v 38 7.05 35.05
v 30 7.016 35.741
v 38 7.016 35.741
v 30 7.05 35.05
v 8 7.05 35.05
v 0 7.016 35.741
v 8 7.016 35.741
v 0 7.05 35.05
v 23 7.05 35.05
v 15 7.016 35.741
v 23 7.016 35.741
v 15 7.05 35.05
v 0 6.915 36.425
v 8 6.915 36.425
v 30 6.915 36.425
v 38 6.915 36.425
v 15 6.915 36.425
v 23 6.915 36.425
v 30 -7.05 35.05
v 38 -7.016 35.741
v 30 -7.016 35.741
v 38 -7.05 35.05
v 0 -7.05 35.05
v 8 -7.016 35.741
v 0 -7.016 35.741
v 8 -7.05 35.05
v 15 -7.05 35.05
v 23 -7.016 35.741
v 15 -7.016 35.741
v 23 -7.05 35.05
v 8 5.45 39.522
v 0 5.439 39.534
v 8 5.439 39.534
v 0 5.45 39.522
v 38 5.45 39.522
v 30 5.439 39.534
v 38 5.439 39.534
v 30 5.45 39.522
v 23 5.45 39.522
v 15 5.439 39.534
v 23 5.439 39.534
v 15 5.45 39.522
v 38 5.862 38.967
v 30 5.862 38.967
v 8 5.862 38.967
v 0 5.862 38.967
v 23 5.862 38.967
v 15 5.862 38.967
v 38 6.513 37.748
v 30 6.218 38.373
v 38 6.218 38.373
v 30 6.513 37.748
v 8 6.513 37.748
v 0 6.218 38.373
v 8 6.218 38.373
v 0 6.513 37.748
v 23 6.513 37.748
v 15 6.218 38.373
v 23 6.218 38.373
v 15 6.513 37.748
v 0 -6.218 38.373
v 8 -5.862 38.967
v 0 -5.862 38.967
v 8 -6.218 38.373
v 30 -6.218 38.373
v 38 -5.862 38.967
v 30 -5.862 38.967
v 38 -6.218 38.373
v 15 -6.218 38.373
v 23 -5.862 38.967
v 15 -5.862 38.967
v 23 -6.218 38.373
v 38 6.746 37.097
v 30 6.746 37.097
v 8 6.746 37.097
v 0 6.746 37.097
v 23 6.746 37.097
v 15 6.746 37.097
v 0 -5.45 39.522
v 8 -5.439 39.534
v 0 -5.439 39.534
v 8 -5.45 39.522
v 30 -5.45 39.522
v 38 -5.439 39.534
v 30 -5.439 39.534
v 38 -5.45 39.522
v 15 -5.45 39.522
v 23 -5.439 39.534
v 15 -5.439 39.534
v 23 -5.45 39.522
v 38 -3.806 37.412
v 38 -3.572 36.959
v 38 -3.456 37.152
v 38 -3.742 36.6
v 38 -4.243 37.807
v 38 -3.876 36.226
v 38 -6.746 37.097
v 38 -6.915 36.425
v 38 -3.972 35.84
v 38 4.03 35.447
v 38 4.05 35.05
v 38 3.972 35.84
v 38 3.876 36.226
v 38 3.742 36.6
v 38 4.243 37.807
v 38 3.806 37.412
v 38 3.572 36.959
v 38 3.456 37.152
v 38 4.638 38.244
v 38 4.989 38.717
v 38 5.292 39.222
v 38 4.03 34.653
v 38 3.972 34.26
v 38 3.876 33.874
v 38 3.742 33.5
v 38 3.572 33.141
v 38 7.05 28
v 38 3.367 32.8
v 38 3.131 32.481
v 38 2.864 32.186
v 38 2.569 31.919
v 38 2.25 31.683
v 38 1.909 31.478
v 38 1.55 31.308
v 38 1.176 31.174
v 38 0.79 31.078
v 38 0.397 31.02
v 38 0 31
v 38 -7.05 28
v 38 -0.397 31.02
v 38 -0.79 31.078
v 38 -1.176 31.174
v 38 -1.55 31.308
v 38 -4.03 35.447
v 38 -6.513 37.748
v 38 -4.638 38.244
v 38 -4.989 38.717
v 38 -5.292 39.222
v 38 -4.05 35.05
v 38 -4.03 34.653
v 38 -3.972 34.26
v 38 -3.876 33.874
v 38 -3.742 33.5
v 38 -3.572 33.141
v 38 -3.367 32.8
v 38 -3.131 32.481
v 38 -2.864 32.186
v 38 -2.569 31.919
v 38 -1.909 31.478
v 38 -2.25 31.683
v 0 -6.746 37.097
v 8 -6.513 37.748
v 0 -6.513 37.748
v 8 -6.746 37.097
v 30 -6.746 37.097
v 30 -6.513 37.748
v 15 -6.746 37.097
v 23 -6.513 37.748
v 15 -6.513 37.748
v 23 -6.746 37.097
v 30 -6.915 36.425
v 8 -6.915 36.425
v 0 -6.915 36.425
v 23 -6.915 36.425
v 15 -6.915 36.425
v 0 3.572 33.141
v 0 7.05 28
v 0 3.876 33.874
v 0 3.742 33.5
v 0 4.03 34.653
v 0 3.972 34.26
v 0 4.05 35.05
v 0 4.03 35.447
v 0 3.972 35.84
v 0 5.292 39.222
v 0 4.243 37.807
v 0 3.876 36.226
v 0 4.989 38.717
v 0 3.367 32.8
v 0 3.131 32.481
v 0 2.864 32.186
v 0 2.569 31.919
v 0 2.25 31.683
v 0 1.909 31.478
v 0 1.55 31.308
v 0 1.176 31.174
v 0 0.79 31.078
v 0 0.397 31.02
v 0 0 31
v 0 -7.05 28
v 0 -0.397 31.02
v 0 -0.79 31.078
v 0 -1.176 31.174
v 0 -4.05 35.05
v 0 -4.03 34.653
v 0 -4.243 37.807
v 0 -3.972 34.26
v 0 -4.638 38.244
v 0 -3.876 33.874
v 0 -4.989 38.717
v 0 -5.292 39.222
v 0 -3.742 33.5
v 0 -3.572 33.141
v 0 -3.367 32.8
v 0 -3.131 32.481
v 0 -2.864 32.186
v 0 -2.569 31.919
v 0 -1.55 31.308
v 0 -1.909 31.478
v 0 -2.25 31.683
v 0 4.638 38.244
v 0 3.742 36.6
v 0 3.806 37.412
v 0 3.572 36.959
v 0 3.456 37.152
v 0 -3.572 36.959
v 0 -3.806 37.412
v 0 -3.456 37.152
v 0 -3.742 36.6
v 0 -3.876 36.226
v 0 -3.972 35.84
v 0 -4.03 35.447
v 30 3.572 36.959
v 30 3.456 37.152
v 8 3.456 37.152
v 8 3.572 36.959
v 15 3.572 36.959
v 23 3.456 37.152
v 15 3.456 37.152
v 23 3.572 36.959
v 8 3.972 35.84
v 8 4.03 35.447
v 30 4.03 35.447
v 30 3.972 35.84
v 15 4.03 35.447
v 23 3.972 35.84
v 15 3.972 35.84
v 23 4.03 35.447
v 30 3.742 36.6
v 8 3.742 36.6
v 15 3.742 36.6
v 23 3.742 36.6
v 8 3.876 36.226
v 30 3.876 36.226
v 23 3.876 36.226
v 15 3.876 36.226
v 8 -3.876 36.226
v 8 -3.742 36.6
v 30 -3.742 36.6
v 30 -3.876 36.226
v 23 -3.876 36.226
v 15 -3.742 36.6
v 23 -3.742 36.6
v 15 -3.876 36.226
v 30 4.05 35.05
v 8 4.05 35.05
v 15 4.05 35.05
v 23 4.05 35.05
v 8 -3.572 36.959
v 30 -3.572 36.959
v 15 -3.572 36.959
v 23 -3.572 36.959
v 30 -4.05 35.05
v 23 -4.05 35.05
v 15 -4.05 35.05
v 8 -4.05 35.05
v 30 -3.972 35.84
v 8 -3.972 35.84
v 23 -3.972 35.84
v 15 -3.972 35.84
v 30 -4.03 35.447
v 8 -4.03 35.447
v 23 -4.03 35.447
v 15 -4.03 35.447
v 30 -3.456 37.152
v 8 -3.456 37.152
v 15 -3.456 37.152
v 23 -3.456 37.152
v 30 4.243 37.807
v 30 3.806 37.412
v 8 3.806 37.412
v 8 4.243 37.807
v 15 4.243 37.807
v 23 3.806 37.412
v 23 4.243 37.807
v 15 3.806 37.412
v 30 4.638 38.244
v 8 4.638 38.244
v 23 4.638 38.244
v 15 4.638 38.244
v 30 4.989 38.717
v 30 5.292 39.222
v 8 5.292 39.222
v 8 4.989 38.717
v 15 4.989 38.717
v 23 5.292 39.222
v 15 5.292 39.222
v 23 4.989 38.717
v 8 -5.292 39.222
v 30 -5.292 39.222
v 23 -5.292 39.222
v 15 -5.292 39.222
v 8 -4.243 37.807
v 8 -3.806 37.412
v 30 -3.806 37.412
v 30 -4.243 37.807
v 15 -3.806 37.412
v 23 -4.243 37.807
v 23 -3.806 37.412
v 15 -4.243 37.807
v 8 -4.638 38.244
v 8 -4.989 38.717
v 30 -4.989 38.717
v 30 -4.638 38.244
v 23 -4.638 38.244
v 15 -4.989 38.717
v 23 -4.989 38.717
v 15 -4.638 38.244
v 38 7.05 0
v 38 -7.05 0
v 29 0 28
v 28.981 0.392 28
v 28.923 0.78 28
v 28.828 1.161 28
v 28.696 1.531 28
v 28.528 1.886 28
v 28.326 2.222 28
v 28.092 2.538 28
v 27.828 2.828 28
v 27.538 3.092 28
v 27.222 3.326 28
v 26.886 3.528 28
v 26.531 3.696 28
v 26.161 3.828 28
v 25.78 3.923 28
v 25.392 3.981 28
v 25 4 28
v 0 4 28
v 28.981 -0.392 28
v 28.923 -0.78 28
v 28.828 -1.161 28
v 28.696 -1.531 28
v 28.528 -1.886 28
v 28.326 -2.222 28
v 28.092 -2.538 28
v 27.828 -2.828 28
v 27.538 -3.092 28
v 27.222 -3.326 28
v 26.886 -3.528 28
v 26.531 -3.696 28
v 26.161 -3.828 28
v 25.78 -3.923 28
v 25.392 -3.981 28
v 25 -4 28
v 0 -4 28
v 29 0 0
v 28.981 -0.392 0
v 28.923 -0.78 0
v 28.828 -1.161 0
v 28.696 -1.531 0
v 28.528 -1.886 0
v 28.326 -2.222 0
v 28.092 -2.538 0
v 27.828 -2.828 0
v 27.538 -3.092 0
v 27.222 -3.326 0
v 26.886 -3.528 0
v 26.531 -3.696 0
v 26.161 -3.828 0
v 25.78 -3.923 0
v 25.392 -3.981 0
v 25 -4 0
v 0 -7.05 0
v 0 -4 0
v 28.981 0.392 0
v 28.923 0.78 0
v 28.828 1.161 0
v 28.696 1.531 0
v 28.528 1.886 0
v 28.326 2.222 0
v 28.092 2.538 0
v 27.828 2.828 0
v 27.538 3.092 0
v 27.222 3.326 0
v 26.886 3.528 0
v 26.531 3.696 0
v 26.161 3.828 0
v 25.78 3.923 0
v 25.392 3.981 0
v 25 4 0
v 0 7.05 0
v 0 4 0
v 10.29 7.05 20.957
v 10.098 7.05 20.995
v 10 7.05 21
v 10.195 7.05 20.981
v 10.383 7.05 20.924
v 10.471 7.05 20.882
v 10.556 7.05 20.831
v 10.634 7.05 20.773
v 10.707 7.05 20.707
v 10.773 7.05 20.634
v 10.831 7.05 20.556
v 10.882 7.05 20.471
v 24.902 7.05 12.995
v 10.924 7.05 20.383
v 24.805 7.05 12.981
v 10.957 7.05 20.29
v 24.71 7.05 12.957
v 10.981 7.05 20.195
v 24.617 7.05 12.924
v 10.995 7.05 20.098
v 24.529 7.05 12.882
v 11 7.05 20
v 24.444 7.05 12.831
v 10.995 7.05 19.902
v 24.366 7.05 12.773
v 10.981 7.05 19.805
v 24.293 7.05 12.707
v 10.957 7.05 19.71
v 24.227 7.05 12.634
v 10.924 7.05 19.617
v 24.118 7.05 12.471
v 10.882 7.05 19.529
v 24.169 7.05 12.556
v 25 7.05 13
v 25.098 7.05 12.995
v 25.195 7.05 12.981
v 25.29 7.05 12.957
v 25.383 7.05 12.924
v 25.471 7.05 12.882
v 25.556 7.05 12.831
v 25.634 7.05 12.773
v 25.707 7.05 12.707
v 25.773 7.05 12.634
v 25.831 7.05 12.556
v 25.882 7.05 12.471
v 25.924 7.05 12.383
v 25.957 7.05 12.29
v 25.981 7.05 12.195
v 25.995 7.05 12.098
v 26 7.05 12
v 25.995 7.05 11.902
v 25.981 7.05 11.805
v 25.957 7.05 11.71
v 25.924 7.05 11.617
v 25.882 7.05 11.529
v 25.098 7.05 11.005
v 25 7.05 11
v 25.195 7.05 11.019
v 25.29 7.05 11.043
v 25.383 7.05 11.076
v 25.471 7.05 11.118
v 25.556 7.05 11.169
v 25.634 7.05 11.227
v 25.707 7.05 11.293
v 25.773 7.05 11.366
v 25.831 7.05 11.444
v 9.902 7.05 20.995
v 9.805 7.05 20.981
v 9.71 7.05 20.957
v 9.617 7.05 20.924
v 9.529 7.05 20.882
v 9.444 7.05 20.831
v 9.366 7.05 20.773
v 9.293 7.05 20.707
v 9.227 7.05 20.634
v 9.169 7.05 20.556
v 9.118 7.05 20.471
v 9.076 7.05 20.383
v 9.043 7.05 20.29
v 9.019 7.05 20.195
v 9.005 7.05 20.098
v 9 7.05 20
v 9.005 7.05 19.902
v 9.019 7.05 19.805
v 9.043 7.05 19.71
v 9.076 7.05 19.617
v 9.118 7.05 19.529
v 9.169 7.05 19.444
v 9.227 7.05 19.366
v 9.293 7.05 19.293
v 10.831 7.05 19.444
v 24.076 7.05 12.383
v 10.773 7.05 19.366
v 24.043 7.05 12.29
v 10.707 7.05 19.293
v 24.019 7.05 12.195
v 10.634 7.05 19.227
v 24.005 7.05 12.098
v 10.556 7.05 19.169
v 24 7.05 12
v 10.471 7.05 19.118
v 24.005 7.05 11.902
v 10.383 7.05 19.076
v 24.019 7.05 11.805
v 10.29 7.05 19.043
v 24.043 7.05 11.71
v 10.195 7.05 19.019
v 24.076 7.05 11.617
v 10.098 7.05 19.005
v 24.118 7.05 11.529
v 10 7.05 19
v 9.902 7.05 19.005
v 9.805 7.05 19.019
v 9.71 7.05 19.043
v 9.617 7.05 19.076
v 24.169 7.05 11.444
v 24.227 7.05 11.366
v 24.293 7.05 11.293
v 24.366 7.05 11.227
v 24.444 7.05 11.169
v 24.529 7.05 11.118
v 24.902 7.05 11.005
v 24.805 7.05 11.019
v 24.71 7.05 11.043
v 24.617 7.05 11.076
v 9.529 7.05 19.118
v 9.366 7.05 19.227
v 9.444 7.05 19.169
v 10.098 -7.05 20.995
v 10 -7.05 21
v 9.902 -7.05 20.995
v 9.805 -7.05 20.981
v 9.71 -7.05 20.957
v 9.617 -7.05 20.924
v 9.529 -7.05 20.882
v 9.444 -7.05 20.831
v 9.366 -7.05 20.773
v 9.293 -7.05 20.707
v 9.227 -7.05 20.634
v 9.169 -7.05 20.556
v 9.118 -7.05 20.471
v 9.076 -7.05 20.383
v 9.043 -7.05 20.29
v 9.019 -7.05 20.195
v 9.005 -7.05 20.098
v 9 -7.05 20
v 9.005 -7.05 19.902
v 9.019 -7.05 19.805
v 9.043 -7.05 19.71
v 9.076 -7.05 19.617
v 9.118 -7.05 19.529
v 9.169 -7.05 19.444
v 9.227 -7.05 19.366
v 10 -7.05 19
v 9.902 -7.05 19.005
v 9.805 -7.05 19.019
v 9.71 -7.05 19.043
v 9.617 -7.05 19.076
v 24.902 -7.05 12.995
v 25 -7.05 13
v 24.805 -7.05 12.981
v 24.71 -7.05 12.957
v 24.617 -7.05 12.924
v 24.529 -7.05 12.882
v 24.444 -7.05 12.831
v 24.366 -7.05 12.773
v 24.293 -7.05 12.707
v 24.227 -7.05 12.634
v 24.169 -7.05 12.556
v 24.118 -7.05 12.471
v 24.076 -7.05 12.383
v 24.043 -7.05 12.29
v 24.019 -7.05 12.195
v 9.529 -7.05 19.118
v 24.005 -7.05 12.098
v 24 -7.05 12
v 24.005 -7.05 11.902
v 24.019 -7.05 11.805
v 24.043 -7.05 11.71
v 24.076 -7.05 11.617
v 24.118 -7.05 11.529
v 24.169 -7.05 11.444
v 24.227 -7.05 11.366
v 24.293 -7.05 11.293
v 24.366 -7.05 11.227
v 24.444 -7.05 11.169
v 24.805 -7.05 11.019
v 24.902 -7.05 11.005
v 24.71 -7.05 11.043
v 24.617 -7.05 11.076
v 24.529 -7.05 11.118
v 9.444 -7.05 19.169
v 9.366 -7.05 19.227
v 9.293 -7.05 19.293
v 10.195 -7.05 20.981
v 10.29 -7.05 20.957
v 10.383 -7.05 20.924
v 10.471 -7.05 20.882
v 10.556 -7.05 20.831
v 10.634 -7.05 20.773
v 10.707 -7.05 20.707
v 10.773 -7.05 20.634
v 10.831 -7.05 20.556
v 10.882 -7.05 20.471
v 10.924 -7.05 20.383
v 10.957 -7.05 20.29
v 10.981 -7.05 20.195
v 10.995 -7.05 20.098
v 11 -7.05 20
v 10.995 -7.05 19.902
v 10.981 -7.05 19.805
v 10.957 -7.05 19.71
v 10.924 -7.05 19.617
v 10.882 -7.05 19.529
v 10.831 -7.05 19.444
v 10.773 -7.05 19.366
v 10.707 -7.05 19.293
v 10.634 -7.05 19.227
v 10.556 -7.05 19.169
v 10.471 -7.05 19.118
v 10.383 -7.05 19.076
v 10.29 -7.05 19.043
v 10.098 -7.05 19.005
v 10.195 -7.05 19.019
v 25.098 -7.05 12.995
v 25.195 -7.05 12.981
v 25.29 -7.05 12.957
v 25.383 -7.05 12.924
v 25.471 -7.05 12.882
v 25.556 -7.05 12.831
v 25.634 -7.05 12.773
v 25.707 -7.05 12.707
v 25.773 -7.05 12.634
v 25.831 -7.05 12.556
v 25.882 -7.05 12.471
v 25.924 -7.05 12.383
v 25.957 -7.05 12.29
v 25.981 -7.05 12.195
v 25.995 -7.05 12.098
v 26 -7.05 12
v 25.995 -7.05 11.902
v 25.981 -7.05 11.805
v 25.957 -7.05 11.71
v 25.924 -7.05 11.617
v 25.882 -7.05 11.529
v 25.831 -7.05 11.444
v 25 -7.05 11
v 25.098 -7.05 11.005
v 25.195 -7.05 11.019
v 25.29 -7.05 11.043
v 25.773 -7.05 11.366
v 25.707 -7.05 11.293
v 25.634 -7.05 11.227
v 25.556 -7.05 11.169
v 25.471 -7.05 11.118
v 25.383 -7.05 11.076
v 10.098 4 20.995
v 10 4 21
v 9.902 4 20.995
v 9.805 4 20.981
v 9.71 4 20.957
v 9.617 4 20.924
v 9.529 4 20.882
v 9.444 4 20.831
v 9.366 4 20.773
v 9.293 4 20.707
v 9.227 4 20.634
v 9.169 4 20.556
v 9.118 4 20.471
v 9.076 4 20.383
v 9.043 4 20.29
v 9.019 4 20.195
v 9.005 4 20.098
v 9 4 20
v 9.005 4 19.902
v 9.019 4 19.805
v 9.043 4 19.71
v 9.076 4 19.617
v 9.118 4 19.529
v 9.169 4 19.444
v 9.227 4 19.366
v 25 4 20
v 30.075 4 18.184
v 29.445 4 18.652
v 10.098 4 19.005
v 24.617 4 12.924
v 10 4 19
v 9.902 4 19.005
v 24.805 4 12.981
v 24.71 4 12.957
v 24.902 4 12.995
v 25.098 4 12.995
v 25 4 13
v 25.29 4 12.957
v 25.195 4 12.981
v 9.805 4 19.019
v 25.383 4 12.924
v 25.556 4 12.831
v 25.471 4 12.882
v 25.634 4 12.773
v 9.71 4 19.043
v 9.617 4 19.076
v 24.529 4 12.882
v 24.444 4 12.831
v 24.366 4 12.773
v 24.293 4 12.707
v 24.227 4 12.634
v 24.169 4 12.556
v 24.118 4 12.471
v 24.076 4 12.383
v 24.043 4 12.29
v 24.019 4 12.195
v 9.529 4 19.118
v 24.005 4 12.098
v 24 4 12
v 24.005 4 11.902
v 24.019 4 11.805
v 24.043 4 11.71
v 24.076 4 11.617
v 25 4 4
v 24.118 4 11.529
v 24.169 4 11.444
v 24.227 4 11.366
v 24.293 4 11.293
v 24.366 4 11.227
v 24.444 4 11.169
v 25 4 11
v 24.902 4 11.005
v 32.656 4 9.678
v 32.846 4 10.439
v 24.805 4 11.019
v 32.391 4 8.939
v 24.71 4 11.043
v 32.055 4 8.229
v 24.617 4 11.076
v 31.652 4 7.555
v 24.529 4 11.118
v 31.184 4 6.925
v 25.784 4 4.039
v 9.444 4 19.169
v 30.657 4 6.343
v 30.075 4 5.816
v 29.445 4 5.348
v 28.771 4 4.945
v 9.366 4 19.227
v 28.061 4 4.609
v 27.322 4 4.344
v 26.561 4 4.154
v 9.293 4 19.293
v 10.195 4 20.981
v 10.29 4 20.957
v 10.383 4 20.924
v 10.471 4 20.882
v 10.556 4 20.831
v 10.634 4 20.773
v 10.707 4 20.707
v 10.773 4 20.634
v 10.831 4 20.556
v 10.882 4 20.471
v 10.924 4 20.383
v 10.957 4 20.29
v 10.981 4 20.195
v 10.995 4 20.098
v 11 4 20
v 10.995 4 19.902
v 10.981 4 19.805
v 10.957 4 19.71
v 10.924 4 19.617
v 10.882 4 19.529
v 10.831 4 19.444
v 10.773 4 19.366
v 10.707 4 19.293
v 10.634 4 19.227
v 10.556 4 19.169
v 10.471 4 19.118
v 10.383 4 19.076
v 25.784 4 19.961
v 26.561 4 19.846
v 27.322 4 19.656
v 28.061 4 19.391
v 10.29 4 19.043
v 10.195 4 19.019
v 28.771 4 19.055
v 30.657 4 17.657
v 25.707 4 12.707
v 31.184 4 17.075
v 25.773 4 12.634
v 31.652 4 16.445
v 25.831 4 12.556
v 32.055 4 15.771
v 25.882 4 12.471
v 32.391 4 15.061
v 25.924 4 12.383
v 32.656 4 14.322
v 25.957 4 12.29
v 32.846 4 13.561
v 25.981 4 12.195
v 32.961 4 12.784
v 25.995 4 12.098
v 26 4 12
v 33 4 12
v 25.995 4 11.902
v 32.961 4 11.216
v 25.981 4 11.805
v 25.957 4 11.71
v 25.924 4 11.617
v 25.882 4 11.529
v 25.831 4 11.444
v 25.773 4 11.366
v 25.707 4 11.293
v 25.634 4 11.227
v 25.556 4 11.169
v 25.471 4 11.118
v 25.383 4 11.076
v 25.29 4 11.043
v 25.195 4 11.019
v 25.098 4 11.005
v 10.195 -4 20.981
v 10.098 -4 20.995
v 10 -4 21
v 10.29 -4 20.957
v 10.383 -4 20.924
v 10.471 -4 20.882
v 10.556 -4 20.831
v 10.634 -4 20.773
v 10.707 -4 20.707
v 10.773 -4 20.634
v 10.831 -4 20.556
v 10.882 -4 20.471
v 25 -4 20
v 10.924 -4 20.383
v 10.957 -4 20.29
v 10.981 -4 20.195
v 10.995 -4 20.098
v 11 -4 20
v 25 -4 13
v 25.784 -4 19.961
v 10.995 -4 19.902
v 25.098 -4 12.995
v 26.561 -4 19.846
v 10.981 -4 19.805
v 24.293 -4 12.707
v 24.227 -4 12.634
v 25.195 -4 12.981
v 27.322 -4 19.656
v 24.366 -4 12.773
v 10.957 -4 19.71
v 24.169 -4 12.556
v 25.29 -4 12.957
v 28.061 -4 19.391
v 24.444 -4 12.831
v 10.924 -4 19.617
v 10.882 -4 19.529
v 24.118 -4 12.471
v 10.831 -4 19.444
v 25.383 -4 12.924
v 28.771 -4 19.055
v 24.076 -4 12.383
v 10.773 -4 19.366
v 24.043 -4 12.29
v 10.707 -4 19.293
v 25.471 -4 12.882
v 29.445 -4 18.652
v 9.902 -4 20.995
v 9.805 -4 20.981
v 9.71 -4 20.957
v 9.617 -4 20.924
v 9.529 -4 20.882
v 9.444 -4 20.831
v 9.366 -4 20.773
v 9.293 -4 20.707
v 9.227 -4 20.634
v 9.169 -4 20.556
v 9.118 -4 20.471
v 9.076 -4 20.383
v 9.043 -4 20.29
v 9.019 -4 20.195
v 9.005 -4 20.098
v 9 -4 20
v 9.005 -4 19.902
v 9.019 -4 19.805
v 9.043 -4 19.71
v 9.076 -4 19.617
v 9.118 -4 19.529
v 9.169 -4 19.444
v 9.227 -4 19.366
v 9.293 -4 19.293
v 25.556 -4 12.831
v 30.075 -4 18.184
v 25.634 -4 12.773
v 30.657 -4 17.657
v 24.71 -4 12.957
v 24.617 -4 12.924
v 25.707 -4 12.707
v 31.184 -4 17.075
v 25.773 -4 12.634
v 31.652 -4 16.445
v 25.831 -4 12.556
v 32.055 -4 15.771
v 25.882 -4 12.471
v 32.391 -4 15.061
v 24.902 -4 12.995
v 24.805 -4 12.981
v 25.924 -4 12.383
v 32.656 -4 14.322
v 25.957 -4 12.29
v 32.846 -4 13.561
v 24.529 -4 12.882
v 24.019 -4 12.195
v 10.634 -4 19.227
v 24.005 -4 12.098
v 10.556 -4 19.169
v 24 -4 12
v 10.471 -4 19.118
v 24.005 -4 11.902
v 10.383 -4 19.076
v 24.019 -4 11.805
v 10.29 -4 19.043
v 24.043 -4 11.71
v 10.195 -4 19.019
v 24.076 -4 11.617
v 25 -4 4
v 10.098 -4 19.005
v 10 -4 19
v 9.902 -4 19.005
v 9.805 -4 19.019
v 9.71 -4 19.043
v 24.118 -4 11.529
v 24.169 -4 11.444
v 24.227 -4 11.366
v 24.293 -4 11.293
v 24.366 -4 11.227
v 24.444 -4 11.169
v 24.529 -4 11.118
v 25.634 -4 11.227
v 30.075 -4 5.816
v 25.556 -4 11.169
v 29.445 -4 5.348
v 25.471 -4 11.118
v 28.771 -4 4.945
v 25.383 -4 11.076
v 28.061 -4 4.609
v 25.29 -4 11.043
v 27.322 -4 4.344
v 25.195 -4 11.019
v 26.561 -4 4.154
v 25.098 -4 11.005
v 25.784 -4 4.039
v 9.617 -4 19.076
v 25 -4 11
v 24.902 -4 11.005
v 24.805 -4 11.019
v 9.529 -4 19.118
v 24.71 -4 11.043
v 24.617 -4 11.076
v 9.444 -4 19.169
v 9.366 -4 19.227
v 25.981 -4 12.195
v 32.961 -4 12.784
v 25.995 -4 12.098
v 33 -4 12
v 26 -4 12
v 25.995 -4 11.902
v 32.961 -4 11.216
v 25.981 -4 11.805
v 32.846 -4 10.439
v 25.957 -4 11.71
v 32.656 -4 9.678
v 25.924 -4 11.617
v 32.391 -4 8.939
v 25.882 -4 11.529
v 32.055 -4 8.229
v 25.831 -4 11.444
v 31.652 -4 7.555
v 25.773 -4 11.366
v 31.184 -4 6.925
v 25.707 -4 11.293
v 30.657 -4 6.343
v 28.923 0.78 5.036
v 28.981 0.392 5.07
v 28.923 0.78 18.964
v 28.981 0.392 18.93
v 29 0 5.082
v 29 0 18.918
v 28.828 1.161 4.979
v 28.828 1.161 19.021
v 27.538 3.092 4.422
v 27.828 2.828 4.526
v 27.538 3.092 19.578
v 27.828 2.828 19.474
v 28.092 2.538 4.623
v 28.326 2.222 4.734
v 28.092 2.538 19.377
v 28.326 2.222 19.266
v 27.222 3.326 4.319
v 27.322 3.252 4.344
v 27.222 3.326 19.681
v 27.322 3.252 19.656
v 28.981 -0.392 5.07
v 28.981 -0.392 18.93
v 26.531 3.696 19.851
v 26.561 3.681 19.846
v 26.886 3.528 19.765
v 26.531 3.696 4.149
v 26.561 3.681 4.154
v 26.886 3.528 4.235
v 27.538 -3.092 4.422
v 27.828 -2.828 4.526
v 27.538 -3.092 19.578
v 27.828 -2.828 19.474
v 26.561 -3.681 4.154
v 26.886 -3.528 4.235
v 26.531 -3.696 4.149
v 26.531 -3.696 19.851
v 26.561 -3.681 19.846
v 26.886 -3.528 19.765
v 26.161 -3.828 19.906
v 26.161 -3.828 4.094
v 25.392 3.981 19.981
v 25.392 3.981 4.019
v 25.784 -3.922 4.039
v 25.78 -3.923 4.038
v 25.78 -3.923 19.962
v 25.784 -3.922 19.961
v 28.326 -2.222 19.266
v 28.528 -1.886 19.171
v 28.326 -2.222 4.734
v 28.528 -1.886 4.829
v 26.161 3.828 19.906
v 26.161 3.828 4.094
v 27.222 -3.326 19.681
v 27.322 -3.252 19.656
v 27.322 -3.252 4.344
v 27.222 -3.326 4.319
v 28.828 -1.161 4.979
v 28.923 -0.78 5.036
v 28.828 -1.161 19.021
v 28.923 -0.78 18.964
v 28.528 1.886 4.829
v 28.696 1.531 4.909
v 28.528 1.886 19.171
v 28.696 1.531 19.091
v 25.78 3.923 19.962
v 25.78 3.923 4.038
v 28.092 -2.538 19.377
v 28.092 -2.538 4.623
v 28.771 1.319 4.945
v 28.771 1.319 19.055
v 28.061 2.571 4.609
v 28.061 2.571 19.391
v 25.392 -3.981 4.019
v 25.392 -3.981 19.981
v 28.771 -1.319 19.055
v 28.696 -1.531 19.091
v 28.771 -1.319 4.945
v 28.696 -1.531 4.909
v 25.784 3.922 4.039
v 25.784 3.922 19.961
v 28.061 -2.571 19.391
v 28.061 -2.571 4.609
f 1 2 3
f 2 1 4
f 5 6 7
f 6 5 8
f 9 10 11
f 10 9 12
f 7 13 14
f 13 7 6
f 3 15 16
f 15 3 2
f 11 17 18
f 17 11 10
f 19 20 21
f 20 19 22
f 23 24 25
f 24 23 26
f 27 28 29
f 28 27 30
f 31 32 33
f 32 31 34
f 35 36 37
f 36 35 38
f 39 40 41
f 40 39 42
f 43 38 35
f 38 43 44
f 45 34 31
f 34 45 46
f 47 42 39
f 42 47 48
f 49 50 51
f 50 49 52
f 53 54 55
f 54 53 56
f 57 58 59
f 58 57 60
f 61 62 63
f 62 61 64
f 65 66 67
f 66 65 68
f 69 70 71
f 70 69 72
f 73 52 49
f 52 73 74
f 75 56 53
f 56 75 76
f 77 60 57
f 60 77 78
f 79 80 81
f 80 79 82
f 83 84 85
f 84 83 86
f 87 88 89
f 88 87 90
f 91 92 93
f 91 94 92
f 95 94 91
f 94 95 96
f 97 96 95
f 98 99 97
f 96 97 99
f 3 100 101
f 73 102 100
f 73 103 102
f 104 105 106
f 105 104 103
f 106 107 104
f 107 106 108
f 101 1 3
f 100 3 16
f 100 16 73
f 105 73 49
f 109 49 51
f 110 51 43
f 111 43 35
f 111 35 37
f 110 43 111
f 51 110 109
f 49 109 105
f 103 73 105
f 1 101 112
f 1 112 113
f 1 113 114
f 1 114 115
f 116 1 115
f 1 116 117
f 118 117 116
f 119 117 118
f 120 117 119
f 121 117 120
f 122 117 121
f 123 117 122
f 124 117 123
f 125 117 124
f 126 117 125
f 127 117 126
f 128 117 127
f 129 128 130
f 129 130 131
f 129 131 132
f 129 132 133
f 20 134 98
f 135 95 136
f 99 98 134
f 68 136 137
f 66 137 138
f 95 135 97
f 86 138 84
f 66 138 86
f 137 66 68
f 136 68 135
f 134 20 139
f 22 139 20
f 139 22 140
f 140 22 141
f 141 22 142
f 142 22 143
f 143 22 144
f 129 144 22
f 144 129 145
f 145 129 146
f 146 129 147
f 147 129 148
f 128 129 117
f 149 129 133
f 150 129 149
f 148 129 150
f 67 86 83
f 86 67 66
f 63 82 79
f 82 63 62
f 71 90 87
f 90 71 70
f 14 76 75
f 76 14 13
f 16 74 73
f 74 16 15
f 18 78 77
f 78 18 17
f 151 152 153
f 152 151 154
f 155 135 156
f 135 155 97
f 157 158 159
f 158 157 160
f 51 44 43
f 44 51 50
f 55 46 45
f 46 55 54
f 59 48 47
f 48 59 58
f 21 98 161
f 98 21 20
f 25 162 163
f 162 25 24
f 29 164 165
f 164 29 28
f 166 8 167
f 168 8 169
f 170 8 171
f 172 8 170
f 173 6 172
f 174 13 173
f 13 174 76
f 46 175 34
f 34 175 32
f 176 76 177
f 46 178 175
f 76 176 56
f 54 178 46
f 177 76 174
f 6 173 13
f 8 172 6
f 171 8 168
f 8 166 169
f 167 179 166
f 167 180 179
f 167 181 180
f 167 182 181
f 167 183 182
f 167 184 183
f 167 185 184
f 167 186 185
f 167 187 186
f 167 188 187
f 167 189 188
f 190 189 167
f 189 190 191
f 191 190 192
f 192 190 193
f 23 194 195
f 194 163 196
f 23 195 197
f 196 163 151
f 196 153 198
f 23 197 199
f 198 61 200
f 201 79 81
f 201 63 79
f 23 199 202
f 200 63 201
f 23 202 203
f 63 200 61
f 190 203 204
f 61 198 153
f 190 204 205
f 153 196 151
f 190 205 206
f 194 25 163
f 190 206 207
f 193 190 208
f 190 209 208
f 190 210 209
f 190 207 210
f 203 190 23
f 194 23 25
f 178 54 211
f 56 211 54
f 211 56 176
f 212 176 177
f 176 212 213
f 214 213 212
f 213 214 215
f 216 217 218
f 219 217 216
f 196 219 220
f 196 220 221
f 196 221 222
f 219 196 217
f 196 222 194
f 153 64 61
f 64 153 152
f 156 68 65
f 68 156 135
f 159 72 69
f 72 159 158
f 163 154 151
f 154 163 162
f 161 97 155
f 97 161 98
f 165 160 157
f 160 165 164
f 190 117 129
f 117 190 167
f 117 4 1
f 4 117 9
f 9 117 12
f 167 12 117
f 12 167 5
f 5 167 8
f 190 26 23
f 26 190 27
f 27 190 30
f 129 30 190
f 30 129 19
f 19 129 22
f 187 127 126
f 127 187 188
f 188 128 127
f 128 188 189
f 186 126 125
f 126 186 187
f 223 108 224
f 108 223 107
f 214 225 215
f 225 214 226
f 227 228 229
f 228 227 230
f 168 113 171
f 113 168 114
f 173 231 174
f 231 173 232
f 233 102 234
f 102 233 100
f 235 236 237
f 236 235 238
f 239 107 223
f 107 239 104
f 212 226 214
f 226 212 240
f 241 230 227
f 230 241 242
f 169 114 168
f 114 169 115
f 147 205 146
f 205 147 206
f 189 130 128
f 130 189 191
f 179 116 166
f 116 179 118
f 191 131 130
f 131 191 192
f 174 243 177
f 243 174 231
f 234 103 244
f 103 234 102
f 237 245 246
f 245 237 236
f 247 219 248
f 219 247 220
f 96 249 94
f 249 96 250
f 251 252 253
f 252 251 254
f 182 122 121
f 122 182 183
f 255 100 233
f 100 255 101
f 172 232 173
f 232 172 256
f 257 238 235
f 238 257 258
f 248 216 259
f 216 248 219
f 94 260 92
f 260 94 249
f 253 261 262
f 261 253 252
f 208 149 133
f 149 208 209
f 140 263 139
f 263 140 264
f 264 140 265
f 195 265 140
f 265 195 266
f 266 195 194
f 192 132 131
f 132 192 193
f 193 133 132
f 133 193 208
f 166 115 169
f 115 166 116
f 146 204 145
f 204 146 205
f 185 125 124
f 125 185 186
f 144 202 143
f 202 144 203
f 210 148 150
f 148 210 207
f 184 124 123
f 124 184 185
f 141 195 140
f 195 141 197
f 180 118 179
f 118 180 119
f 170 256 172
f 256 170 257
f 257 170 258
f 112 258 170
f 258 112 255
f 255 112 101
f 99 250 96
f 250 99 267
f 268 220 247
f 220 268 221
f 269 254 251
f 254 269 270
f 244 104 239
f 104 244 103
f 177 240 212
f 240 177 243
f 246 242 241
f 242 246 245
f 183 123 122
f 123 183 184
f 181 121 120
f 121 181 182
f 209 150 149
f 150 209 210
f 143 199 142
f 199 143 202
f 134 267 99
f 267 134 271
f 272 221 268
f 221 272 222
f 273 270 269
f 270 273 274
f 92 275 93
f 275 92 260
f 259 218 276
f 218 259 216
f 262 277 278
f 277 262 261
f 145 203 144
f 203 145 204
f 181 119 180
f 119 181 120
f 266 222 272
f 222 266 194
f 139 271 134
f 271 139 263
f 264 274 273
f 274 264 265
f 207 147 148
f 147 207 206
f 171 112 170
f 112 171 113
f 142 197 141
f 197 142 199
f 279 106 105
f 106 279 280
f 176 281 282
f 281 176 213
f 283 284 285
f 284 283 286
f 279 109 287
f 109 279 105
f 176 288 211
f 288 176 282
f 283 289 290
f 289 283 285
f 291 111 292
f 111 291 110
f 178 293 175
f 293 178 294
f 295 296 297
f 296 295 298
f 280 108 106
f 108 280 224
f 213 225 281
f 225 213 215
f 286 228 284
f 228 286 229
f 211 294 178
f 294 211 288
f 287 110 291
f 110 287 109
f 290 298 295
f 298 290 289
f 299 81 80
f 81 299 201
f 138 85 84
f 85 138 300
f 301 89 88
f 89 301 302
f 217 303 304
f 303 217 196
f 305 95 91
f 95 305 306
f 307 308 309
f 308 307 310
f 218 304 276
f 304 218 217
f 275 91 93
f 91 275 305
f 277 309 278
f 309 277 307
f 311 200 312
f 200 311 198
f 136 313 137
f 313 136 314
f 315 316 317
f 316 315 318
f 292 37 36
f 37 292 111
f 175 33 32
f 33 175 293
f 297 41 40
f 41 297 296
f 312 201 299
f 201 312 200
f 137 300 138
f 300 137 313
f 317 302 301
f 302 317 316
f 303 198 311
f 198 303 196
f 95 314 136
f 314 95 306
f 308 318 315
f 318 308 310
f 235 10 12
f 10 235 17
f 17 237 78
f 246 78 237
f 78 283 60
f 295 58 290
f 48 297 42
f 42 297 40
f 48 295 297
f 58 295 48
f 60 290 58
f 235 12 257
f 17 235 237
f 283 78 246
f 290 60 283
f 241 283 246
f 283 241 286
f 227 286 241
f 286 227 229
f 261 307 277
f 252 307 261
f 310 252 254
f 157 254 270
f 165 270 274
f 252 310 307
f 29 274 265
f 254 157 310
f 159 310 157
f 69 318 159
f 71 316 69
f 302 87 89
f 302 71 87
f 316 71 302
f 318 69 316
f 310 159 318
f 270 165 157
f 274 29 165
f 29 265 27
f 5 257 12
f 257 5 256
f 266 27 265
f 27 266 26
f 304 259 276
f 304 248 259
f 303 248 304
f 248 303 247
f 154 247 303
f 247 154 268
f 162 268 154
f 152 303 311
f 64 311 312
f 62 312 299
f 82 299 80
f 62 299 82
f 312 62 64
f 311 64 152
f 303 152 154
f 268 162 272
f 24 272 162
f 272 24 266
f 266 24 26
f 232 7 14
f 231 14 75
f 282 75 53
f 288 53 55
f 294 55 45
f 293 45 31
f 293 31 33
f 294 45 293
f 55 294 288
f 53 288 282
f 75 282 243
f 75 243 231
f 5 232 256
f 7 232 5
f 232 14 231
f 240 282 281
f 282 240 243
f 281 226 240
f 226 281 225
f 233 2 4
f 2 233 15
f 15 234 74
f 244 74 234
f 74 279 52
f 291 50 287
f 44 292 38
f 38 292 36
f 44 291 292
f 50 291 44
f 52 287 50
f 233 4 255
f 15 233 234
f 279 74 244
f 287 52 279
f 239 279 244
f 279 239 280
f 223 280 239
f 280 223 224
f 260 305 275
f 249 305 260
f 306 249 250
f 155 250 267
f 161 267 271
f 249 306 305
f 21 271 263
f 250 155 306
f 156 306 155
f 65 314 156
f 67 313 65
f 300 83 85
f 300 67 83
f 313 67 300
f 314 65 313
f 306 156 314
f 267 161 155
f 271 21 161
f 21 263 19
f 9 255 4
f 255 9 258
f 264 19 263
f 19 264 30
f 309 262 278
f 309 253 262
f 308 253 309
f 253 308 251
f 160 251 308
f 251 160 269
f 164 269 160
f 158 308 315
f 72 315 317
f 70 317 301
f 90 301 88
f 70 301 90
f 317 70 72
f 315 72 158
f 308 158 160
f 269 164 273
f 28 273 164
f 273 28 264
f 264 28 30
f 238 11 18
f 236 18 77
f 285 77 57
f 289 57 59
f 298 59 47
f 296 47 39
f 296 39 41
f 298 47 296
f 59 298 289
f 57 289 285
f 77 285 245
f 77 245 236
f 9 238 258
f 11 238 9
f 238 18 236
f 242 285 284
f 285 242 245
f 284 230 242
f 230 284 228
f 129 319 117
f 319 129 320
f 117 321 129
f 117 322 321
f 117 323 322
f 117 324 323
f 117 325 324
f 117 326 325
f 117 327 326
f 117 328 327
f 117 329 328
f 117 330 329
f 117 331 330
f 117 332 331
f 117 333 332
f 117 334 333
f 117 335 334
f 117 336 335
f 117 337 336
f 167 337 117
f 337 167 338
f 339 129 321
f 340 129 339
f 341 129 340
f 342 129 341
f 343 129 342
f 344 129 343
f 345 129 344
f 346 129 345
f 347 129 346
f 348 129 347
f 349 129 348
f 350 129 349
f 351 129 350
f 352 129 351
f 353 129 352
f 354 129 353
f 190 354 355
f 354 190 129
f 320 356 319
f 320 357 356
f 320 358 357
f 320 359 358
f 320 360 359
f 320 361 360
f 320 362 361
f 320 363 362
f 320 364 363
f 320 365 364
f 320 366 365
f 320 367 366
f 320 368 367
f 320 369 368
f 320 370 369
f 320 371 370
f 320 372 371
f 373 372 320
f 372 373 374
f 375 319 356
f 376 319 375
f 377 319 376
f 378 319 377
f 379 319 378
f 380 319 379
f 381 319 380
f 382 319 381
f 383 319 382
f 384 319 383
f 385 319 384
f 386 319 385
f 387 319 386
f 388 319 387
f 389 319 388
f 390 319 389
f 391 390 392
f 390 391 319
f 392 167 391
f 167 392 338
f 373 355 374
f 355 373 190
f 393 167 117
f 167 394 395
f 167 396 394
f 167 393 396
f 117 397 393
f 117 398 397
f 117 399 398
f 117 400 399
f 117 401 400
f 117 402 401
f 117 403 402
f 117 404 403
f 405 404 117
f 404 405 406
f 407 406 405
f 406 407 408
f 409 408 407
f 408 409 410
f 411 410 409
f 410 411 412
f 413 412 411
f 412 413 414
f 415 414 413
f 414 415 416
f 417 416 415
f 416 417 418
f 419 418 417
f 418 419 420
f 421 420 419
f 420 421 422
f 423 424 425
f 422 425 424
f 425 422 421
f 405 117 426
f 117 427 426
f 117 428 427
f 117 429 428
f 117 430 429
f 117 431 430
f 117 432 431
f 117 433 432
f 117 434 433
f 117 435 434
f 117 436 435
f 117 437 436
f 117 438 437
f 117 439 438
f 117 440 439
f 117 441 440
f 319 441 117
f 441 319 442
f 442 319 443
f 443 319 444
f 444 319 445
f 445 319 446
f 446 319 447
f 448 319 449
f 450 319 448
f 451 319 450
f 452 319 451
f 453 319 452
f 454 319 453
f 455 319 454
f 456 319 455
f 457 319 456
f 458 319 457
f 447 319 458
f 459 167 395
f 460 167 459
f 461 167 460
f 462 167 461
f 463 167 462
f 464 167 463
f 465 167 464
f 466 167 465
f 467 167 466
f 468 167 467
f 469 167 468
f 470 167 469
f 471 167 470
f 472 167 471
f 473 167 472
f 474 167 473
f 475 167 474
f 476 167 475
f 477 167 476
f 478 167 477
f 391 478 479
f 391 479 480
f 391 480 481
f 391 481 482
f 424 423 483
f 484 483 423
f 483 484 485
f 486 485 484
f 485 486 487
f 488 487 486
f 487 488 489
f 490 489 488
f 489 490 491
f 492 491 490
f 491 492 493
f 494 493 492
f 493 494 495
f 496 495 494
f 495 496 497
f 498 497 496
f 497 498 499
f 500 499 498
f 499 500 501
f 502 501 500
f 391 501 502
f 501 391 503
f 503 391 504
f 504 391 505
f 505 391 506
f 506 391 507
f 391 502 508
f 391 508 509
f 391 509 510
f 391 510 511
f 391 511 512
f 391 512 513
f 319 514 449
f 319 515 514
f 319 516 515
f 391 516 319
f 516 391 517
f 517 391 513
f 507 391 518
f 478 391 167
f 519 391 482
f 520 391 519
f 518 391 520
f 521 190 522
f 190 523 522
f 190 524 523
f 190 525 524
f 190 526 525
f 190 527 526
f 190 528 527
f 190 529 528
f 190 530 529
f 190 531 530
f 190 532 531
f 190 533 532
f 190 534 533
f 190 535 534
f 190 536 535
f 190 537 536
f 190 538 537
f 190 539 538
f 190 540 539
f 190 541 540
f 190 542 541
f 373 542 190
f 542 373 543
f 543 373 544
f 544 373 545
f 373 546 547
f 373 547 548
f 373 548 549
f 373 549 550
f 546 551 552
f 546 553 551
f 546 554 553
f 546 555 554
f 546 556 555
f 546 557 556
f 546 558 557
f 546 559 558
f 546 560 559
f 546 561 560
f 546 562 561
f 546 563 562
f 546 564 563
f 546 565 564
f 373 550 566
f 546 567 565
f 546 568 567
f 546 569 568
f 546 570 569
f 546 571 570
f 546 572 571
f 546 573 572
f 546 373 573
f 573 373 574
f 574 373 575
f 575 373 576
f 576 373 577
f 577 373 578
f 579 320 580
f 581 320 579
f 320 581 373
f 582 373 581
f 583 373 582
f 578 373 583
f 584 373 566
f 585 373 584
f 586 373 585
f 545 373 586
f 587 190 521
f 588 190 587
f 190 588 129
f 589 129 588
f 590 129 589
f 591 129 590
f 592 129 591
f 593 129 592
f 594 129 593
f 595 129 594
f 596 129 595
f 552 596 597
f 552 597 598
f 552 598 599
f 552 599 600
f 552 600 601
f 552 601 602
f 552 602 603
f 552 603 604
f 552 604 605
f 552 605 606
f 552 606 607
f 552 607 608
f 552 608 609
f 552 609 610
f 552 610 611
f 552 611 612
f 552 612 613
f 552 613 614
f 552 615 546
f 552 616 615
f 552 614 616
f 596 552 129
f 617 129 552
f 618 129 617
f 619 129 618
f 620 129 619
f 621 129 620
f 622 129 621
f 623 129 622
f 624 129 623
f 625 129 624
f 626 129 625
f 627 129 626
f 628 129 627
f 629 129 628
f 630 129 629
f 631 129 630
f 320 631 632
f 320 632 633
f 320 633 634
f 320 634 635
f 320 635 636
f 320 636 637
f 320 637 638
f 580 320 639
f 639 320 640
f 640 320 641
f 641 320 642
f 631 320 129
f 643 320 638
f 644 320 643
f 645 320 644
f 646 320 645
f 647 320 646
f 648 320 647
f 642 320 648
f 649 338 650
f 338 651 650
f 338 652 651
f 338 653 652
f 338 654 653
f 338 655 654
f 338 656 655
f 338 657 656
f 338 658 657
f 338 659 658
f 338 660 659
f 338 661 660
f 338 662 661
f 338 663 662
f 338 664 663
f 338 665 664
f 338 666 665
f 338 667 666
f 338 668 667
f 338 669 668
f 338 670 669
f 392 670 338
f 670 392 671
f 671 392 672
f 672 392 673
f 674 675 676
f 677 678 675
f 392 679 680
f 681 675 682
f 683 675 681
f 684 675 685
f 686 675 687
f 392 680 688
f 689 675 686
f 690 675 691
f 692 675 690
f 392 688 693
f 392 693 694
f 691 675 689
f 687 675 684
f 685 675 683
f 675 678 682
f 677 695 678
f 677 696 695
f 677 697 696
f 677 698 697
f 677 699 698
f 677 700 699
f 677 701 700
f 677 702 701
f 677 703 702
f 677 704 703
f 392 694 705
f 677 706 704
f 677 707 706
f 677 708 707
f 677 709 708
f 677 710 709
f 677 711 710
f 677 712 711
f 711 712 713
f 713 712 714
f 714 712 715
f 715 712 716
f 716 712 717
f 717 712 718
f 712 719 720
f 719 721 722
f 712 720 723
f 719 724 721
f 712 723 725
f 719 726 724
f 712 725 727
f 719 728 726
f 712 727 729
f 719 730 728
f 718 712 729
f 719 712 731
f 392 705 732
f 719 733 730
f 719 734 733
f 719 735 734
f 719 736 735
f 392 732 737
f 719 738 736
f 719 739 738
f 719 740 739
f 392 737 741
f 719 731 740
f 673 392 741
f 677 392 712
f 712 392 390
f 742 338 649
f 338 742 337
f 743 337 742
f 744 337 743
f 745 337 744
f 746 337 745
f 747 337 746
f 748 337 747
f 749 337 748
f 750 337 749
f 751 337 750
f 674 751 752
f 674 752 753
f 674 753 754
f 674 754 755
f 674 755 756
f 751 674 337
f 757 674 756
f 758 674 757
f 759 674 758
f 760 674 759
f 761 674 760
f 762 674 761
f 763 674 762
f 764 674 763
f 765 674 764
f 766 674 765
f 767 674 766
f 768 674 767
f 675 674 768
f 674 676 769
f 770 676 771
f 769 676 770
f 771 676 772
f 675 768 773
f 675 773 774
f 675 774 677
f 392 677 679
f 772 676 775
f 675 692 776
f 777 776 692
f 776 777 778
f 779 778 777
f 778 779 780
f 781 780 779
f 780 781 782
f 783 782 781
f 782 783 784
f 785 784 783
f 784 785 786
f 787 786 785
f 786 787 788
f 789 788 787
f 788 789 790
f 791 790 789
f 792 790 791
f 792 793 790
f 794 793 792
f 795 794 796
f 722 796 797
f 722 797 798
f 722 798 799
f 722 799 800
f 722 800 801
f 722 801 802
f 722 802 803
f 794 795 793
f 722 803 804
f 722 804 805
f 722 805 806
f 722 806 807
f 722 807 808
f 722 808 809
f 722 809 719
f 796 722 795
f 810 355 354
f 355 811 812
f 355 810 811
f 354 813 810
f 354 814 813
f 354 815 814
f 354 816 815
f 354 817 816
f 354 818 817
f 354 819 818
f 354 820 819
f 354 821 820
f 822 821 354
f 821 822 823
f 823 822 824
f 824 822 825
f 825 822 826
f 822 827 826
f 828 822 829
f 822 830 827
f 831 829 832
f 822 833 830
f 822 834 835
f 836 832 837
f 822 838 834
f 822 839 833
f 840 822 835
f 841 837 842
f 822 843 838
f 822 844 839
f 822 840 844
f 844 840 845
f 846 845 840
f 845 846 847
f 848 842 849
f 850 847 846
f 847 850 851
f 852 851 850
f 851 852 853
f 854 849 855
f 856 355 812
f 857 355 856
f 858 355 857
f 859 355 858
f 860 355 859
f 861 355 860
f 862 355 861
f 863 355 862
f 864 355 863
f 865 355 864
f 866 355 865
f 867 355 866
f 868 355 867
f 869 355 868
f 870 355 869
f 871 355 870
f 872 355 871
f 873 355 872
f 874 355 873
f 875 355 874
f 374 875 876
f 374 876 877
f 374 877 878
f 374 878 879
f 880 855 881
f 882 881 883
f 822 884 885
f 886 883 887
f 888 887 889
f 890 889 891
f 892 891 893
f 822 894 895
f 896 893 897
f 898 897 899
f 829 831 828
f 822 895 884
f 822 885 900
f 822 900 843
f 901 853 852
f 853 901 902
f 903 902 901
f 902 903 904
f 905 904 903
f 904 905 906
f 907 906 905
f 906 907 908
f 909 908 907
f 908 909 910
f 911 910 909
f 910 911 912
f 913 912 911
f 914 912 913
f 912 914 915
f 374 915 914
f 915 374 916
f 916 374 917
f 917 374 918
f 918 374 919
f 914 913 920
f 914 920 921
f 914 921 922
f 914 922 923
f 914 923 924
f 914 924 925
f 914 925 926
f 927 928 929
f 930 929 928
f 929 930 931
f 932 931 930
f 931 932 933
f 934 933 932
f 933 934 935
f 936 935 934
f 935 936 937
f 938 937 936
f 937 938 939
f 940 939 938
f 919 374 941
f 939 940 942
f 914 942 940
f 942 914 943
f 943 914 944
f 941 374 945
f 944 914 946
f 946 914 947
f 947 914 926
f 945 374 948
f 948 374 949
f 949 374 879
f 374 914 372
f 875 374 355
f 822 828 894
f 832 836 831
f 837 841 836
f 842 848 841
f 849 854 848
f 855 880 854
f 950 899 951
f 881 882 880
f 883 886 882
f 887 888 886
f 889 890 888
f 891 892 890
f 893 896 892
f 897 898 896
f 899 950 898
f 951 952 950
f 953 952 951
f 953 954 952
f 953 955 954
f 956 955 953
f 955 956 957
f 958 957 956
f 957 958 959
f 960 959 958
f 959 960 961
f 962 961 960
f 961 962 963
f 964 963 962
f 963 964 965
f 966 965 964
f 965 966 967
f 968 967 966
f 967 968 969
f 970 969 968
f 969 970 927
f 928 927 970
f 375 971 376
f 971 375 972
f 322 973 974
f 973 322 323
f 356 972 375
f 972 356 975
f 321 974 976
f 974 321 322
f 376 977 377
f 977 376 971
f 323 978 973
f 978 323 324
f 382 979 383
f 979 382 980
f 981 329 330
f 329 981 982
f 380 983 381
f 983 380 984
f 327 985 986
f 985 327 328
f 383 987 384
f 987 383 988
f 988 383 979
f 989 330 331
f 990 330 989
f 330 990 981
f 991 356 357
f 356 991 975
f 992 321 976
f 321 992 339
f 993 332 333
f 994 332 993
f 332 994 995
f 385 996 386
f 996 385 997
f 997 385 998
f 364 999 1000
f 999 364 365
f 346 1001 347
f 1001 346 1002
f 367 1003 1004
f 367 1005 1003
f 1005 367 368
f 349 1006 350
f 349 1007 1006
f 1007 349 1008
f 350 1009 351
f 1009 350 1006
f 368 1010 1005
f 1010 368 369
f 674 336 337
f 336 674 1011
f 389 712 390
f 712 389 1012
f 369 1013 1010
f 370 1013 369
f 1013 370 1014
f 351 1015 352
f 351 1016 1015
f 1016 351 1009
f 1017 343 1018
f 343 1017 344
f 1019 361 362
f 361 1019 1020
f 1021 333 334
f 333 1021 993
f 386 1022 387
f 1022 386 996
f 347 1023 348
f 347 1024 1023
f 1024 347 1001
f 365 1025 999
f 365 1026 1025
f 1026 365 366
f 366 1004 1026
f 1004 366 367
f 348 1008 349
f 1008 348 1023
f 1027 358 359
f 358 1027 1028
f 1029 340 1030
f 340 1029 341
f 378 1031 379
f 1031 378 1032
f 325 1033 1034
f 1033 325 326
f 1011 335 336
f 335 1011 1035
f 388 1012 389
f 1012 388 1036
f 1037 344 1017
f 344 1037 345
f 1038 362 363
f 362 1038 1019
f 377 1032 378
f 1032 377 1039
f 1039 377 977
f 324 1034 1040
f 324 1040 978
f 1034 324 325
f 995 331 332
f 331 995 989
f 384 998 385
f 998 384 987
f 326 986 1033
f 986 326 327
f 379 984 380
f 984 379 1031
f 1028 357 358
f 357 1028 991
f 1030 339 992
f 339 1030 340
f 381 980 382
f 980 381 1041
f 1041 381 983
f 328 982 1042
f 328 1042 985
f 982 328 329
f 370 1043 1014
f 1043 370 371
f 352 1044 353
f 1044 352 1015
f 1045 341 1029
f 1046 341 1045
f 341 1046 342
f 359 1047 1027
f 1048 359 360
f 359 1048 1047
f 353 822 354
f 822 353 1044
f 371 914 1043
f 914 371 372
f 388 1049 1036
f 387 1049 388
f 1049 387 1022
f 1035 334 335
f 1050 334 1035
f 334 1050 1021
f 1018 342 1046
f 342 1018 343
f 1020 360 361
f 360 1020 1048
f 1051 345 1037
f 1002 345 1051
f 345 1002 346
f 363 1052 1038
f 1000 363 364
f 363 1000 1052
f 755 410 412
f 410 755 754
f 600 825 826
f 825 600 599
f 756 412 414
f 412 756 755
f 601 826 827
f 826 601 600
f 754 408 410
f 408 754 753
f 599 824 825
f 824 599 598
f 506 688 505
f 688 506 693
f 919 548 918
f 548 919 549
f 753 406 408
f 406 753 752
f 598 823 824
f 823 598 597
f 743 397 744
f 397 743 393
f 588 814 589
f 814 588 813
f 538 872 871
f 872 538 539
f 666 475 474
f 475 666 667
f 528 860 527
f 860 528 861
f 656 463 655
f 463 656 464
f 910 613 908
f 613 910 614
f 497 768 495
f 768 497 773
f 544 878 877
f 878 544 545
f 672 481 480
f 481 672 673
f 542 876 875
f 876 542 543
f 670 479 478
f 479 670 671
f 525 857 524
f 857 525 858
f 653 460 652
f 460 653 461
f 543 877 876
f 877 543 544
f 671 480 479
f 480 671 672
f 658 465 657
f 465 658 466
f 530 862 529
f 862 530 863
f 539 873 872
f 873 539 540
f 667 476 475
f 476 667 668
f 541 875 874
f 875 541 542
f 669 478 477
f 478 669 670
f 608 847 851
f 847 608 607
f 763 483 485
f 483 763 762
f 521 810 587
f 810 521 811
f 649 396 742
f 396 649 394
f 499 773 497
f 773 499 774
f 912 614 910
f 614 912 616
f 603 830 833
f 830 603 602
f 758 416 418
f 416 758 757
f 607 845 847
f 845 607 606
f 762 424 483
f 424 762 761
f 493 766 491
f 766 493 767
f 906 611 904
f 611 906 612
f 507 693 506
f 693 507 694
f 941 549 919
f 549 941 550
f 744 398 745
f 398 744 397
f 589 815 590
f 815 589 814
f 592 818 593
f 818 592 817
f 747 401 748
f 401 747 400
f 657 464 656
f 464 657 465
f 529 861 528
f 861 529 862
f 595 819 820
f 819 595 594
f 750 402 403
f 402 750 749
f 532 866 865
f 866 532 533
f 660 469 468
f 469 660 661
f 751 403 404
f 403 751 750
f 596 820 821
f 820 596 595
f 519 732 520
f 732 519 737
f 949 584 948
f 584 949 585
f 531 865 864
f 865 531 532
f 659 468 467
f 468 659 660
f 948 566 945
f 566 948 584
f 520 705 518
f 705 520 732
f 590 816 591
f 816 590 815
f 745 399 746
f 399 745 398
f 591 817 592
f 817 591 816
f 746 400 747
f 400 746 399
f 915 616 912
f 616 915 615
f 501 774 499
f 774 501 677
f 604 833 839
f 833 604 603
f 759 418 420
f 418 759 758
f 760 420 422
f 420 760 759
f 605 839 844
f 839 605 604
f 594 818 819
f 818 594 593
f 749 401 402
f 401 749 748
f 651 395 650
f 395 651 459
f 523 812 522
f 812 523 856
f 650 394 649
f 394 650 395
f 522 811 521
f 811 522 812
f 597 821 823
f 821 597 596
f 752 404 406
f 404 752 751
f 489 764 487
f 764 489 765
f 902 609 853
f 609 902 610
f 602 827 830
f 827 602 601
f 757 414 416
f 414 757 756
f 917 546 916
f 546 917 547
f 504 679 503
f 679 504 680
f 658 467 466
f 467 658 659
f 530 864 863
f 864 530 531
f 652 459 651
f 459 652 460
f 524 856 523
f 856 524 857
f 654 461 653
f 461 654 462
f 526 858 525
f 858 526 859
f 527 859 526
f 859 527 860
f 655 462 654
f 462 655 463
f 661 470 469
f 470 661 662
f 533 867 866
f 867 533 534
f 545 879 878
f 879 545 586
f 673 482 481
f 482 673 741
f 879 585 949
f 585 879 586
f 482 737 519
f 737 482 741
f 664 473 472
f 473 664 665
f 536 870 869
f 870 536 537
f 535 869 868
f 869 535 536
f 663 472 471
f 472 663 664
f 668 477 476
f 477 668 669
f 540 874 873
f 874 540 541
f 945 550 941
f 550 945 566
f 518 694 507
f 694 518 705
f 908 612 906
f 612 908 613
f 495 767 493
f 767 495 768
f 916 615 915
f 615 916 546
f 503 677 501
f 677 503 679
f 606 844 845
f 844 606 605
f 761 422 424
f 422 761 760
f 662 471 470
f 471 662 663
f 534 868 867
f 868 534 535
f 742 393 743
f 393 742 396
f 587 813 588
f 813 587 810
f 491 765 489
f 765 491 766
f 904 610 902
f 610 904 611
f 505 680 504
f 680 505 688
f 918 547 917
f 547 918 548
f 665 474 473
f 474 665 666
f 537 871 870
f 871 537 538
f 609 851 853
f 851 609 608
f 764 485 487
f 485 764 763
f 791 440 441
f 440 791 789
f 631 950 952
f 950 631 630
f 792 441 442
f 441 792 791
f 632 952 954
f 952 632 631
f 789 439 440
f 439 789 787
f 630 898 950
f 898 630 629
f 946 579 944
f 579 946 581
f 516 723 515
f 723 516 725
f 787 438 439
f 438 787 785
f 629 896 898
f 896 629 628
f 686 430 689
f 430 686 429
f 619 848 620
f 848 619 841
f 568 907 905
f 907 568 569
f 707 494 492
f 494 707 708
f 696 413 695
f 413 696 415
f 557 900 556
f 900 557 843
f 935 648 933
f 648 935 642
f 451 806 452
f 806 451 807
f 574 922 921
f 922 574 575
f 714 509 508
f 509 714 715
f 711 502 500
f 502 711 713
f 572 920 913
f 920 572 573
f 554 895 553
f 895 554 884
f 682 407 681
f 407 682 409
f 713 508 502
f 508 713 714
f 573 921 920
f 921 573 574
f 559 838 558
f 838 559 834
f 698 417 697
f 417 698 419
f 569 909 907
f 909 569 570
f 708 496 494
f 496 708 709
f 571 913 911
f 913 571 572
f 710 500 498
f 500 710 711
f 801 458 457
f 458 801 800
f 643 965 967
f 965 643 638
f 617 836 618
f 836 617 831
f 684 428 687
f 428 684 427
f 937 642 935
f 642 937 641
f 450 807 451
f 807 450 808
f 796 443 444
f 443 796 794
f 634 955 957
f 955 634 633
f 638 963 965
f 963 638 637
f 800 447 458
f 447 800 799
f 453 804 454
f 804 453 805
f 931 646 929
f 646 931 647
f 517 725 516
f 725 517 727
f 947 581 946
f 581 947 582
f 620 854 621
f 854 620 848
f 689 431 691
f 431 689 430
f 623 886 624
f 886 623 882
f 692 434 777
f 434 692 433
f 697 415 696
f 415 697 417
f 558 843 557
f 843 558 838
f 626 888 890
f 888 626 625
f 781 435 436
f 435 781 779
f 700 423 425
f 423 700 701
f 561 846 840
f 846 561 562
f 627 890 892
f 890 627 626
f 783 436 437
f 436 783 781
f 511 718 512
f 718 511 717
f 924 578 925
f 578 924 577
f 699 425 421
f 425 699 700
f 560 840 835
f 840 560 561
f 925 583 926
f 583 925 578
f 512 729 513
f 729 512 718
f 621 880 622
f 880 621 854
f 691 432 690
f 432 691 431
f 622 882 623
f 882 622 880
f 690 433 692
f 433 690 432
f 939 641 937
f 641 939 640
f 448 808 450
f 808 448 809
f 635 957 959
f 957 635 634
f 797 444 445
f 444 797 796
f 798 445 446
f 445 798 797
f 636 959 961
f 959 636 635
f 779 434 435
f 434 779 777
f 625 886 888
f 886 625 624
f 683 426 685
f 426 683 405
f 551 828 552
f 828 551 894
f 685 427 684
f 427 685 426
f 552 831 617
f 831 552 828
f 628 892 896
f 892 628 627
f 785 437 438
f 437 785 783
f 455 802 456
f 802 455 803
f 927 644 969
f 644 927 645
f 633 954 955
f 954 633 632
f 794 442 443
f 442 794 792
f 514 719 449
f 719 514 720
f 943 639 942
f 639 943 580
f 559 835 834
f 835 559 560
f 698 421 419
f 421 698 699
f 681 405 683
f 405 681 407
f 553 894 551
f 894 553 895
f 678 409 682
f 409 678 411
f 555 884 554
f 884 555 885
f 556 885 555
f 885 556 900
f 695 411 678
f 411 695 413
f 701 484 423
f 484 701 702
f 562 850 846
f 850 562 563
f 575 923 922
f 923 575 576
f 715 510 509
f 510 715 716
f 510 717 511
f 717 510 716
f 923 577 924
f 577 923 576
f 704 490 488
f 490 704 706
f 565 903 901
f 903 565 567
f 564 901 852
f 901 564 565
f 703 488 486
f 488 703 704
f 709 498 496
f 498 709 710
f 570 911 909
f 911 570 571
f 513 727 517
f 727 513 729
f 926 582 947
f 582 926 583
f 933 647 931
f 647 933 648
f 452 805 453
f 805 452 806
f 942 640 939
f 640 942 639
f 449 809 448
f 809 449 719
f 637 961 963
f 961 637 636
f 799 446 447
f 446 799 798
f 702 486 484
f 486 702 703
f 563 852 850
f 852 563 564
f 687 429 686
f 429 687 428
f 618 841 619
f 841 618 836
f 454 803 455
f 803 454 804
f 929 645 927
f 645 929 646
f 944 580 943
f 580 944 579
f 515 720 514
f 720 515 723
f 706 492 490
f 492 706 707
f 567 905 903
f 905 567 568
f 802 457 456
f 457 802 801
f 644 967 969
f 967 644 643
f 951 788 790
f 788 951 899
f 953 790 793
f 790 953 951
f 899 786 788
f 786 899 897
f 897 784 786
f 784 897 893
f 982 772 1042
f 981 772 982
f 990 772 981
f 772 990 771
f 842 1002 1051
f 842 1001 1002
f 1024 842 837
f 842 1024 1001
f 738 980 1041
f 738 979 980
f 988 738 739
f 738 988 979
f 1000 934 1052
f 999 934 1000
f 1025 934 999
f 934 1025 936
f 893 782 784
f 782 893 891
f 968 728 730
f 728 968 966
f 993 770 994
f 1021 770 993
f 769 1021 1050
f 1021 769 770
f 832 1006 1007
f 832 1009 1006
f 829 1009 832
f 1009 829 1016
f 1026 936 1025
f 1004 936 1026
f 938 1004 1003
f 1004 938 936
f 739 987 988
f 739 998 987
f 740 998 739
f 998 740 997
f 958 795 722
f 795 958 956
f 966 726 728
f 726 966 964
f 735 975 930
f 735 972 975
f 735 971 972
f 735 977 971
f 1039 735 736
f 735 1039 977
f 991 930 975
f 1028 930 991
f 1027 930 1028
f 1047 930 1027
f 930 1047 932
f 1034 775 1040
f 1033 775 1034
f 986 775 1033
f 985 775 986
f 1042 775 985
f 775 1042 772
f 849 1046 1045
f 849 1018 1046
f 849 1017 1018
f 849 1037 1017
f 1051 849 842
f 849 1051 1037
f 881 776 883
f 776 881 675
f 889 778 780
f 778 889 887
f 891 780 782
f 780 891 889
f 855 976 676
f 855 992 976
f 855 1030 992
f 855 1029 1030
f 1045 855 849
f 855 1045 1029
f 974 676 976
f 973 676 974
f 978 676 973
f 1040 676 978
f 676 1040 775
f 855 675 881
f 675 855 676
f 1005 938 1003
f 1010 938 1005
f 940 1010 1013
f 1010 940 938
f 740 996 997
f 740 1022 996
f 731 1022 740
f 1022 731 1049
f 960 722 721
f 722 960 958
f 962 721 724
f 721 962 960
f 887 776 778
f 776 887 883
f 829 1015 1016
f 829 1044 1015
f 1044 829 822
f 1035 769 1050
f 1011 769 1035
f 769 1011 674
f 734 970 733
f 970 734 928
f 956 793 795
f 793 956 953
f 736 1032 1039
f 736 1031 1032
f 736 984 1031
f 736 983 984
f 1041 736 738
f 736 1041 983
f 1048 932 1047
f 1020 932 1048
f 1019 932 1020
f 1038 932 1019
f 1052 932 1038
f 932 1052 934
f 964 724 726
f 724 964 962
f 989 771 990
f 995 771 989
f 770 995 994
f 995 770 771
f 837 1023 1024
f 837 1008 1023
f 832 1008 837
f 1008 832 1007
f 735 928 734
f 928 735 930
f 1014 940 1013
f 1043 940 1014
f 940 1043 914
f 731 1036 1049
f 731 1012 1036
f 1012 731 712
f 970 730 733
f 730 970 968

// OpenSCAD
thickness=3;
res=64;

d_top=8.1;

d1=8;
d2=16;

z1=12;
z2=8;
z3=8;
bottom_z = z1+z2+z3;

x1=10;
x2=15;
x3=d1/2;
x4=16;

max_x = 38;

max_y=thickness*2+d_top;

gap_fill=8;
gap=(max_x-(3*gap_fill))/2;

translate([0,0,bottom_z])
top();
bottom();

module bottom(){
    difference(){   
        translate([0,-max_y/2,0])
        cube([max_x,max_y, bottom_z]);

        translate([0,-d1/2,0])
        cube([x1+x2+x3-d1/2,d1, bottom_z]);

        translate([x1+x2,0,0])
        cylinder(d=d1,h=bottom_z,$fn=res);


        //left screw
        translate([x1,0,z1+z2])
        translate([0,max_y/2,0])
        rotate([90,0,0])
        cylinder(d=2, h=max_y, $fn=res);

        //right screw
        translate([x1+x2,0,z1])
        translate([0,max_y/2,0])
        rotate([90,0,0])
        cylinder(d=2, h=max_y, $fn=res);

        //right rotate
        translate([x1+x2,0,z1])
        translate([0,d1/2,0])
        rotate([90,0,0])
        cylinder(d=d2, h=d1, $fn=res);
    }
}

module top(){
    difference(){
        translate([0,0,max_y/2])
        rotate([0,90,0])
        difference(){
            union(){
                cylinder(d=max_y, h=max_x, $fn=res);
                translate([0,-max_y/2,0])
                cube([max_y/2,max_y,max_x]);
            }
            //inner
            cylinder(d=d_top, h=max_x, $fn=res);
            //top
            translate([-7,0,0])
            cylinder(r=6, h=max_x, $fn=64);
        }
        translate([gap_fill,-max_y/2, max_y/2])
        cube([gap,max_y, max_y]);

        translate([gap_fill+gap+gap_fill,-max_y/2, max_y/2])
        cube([gap,max_y, max_y]);
    }
}
